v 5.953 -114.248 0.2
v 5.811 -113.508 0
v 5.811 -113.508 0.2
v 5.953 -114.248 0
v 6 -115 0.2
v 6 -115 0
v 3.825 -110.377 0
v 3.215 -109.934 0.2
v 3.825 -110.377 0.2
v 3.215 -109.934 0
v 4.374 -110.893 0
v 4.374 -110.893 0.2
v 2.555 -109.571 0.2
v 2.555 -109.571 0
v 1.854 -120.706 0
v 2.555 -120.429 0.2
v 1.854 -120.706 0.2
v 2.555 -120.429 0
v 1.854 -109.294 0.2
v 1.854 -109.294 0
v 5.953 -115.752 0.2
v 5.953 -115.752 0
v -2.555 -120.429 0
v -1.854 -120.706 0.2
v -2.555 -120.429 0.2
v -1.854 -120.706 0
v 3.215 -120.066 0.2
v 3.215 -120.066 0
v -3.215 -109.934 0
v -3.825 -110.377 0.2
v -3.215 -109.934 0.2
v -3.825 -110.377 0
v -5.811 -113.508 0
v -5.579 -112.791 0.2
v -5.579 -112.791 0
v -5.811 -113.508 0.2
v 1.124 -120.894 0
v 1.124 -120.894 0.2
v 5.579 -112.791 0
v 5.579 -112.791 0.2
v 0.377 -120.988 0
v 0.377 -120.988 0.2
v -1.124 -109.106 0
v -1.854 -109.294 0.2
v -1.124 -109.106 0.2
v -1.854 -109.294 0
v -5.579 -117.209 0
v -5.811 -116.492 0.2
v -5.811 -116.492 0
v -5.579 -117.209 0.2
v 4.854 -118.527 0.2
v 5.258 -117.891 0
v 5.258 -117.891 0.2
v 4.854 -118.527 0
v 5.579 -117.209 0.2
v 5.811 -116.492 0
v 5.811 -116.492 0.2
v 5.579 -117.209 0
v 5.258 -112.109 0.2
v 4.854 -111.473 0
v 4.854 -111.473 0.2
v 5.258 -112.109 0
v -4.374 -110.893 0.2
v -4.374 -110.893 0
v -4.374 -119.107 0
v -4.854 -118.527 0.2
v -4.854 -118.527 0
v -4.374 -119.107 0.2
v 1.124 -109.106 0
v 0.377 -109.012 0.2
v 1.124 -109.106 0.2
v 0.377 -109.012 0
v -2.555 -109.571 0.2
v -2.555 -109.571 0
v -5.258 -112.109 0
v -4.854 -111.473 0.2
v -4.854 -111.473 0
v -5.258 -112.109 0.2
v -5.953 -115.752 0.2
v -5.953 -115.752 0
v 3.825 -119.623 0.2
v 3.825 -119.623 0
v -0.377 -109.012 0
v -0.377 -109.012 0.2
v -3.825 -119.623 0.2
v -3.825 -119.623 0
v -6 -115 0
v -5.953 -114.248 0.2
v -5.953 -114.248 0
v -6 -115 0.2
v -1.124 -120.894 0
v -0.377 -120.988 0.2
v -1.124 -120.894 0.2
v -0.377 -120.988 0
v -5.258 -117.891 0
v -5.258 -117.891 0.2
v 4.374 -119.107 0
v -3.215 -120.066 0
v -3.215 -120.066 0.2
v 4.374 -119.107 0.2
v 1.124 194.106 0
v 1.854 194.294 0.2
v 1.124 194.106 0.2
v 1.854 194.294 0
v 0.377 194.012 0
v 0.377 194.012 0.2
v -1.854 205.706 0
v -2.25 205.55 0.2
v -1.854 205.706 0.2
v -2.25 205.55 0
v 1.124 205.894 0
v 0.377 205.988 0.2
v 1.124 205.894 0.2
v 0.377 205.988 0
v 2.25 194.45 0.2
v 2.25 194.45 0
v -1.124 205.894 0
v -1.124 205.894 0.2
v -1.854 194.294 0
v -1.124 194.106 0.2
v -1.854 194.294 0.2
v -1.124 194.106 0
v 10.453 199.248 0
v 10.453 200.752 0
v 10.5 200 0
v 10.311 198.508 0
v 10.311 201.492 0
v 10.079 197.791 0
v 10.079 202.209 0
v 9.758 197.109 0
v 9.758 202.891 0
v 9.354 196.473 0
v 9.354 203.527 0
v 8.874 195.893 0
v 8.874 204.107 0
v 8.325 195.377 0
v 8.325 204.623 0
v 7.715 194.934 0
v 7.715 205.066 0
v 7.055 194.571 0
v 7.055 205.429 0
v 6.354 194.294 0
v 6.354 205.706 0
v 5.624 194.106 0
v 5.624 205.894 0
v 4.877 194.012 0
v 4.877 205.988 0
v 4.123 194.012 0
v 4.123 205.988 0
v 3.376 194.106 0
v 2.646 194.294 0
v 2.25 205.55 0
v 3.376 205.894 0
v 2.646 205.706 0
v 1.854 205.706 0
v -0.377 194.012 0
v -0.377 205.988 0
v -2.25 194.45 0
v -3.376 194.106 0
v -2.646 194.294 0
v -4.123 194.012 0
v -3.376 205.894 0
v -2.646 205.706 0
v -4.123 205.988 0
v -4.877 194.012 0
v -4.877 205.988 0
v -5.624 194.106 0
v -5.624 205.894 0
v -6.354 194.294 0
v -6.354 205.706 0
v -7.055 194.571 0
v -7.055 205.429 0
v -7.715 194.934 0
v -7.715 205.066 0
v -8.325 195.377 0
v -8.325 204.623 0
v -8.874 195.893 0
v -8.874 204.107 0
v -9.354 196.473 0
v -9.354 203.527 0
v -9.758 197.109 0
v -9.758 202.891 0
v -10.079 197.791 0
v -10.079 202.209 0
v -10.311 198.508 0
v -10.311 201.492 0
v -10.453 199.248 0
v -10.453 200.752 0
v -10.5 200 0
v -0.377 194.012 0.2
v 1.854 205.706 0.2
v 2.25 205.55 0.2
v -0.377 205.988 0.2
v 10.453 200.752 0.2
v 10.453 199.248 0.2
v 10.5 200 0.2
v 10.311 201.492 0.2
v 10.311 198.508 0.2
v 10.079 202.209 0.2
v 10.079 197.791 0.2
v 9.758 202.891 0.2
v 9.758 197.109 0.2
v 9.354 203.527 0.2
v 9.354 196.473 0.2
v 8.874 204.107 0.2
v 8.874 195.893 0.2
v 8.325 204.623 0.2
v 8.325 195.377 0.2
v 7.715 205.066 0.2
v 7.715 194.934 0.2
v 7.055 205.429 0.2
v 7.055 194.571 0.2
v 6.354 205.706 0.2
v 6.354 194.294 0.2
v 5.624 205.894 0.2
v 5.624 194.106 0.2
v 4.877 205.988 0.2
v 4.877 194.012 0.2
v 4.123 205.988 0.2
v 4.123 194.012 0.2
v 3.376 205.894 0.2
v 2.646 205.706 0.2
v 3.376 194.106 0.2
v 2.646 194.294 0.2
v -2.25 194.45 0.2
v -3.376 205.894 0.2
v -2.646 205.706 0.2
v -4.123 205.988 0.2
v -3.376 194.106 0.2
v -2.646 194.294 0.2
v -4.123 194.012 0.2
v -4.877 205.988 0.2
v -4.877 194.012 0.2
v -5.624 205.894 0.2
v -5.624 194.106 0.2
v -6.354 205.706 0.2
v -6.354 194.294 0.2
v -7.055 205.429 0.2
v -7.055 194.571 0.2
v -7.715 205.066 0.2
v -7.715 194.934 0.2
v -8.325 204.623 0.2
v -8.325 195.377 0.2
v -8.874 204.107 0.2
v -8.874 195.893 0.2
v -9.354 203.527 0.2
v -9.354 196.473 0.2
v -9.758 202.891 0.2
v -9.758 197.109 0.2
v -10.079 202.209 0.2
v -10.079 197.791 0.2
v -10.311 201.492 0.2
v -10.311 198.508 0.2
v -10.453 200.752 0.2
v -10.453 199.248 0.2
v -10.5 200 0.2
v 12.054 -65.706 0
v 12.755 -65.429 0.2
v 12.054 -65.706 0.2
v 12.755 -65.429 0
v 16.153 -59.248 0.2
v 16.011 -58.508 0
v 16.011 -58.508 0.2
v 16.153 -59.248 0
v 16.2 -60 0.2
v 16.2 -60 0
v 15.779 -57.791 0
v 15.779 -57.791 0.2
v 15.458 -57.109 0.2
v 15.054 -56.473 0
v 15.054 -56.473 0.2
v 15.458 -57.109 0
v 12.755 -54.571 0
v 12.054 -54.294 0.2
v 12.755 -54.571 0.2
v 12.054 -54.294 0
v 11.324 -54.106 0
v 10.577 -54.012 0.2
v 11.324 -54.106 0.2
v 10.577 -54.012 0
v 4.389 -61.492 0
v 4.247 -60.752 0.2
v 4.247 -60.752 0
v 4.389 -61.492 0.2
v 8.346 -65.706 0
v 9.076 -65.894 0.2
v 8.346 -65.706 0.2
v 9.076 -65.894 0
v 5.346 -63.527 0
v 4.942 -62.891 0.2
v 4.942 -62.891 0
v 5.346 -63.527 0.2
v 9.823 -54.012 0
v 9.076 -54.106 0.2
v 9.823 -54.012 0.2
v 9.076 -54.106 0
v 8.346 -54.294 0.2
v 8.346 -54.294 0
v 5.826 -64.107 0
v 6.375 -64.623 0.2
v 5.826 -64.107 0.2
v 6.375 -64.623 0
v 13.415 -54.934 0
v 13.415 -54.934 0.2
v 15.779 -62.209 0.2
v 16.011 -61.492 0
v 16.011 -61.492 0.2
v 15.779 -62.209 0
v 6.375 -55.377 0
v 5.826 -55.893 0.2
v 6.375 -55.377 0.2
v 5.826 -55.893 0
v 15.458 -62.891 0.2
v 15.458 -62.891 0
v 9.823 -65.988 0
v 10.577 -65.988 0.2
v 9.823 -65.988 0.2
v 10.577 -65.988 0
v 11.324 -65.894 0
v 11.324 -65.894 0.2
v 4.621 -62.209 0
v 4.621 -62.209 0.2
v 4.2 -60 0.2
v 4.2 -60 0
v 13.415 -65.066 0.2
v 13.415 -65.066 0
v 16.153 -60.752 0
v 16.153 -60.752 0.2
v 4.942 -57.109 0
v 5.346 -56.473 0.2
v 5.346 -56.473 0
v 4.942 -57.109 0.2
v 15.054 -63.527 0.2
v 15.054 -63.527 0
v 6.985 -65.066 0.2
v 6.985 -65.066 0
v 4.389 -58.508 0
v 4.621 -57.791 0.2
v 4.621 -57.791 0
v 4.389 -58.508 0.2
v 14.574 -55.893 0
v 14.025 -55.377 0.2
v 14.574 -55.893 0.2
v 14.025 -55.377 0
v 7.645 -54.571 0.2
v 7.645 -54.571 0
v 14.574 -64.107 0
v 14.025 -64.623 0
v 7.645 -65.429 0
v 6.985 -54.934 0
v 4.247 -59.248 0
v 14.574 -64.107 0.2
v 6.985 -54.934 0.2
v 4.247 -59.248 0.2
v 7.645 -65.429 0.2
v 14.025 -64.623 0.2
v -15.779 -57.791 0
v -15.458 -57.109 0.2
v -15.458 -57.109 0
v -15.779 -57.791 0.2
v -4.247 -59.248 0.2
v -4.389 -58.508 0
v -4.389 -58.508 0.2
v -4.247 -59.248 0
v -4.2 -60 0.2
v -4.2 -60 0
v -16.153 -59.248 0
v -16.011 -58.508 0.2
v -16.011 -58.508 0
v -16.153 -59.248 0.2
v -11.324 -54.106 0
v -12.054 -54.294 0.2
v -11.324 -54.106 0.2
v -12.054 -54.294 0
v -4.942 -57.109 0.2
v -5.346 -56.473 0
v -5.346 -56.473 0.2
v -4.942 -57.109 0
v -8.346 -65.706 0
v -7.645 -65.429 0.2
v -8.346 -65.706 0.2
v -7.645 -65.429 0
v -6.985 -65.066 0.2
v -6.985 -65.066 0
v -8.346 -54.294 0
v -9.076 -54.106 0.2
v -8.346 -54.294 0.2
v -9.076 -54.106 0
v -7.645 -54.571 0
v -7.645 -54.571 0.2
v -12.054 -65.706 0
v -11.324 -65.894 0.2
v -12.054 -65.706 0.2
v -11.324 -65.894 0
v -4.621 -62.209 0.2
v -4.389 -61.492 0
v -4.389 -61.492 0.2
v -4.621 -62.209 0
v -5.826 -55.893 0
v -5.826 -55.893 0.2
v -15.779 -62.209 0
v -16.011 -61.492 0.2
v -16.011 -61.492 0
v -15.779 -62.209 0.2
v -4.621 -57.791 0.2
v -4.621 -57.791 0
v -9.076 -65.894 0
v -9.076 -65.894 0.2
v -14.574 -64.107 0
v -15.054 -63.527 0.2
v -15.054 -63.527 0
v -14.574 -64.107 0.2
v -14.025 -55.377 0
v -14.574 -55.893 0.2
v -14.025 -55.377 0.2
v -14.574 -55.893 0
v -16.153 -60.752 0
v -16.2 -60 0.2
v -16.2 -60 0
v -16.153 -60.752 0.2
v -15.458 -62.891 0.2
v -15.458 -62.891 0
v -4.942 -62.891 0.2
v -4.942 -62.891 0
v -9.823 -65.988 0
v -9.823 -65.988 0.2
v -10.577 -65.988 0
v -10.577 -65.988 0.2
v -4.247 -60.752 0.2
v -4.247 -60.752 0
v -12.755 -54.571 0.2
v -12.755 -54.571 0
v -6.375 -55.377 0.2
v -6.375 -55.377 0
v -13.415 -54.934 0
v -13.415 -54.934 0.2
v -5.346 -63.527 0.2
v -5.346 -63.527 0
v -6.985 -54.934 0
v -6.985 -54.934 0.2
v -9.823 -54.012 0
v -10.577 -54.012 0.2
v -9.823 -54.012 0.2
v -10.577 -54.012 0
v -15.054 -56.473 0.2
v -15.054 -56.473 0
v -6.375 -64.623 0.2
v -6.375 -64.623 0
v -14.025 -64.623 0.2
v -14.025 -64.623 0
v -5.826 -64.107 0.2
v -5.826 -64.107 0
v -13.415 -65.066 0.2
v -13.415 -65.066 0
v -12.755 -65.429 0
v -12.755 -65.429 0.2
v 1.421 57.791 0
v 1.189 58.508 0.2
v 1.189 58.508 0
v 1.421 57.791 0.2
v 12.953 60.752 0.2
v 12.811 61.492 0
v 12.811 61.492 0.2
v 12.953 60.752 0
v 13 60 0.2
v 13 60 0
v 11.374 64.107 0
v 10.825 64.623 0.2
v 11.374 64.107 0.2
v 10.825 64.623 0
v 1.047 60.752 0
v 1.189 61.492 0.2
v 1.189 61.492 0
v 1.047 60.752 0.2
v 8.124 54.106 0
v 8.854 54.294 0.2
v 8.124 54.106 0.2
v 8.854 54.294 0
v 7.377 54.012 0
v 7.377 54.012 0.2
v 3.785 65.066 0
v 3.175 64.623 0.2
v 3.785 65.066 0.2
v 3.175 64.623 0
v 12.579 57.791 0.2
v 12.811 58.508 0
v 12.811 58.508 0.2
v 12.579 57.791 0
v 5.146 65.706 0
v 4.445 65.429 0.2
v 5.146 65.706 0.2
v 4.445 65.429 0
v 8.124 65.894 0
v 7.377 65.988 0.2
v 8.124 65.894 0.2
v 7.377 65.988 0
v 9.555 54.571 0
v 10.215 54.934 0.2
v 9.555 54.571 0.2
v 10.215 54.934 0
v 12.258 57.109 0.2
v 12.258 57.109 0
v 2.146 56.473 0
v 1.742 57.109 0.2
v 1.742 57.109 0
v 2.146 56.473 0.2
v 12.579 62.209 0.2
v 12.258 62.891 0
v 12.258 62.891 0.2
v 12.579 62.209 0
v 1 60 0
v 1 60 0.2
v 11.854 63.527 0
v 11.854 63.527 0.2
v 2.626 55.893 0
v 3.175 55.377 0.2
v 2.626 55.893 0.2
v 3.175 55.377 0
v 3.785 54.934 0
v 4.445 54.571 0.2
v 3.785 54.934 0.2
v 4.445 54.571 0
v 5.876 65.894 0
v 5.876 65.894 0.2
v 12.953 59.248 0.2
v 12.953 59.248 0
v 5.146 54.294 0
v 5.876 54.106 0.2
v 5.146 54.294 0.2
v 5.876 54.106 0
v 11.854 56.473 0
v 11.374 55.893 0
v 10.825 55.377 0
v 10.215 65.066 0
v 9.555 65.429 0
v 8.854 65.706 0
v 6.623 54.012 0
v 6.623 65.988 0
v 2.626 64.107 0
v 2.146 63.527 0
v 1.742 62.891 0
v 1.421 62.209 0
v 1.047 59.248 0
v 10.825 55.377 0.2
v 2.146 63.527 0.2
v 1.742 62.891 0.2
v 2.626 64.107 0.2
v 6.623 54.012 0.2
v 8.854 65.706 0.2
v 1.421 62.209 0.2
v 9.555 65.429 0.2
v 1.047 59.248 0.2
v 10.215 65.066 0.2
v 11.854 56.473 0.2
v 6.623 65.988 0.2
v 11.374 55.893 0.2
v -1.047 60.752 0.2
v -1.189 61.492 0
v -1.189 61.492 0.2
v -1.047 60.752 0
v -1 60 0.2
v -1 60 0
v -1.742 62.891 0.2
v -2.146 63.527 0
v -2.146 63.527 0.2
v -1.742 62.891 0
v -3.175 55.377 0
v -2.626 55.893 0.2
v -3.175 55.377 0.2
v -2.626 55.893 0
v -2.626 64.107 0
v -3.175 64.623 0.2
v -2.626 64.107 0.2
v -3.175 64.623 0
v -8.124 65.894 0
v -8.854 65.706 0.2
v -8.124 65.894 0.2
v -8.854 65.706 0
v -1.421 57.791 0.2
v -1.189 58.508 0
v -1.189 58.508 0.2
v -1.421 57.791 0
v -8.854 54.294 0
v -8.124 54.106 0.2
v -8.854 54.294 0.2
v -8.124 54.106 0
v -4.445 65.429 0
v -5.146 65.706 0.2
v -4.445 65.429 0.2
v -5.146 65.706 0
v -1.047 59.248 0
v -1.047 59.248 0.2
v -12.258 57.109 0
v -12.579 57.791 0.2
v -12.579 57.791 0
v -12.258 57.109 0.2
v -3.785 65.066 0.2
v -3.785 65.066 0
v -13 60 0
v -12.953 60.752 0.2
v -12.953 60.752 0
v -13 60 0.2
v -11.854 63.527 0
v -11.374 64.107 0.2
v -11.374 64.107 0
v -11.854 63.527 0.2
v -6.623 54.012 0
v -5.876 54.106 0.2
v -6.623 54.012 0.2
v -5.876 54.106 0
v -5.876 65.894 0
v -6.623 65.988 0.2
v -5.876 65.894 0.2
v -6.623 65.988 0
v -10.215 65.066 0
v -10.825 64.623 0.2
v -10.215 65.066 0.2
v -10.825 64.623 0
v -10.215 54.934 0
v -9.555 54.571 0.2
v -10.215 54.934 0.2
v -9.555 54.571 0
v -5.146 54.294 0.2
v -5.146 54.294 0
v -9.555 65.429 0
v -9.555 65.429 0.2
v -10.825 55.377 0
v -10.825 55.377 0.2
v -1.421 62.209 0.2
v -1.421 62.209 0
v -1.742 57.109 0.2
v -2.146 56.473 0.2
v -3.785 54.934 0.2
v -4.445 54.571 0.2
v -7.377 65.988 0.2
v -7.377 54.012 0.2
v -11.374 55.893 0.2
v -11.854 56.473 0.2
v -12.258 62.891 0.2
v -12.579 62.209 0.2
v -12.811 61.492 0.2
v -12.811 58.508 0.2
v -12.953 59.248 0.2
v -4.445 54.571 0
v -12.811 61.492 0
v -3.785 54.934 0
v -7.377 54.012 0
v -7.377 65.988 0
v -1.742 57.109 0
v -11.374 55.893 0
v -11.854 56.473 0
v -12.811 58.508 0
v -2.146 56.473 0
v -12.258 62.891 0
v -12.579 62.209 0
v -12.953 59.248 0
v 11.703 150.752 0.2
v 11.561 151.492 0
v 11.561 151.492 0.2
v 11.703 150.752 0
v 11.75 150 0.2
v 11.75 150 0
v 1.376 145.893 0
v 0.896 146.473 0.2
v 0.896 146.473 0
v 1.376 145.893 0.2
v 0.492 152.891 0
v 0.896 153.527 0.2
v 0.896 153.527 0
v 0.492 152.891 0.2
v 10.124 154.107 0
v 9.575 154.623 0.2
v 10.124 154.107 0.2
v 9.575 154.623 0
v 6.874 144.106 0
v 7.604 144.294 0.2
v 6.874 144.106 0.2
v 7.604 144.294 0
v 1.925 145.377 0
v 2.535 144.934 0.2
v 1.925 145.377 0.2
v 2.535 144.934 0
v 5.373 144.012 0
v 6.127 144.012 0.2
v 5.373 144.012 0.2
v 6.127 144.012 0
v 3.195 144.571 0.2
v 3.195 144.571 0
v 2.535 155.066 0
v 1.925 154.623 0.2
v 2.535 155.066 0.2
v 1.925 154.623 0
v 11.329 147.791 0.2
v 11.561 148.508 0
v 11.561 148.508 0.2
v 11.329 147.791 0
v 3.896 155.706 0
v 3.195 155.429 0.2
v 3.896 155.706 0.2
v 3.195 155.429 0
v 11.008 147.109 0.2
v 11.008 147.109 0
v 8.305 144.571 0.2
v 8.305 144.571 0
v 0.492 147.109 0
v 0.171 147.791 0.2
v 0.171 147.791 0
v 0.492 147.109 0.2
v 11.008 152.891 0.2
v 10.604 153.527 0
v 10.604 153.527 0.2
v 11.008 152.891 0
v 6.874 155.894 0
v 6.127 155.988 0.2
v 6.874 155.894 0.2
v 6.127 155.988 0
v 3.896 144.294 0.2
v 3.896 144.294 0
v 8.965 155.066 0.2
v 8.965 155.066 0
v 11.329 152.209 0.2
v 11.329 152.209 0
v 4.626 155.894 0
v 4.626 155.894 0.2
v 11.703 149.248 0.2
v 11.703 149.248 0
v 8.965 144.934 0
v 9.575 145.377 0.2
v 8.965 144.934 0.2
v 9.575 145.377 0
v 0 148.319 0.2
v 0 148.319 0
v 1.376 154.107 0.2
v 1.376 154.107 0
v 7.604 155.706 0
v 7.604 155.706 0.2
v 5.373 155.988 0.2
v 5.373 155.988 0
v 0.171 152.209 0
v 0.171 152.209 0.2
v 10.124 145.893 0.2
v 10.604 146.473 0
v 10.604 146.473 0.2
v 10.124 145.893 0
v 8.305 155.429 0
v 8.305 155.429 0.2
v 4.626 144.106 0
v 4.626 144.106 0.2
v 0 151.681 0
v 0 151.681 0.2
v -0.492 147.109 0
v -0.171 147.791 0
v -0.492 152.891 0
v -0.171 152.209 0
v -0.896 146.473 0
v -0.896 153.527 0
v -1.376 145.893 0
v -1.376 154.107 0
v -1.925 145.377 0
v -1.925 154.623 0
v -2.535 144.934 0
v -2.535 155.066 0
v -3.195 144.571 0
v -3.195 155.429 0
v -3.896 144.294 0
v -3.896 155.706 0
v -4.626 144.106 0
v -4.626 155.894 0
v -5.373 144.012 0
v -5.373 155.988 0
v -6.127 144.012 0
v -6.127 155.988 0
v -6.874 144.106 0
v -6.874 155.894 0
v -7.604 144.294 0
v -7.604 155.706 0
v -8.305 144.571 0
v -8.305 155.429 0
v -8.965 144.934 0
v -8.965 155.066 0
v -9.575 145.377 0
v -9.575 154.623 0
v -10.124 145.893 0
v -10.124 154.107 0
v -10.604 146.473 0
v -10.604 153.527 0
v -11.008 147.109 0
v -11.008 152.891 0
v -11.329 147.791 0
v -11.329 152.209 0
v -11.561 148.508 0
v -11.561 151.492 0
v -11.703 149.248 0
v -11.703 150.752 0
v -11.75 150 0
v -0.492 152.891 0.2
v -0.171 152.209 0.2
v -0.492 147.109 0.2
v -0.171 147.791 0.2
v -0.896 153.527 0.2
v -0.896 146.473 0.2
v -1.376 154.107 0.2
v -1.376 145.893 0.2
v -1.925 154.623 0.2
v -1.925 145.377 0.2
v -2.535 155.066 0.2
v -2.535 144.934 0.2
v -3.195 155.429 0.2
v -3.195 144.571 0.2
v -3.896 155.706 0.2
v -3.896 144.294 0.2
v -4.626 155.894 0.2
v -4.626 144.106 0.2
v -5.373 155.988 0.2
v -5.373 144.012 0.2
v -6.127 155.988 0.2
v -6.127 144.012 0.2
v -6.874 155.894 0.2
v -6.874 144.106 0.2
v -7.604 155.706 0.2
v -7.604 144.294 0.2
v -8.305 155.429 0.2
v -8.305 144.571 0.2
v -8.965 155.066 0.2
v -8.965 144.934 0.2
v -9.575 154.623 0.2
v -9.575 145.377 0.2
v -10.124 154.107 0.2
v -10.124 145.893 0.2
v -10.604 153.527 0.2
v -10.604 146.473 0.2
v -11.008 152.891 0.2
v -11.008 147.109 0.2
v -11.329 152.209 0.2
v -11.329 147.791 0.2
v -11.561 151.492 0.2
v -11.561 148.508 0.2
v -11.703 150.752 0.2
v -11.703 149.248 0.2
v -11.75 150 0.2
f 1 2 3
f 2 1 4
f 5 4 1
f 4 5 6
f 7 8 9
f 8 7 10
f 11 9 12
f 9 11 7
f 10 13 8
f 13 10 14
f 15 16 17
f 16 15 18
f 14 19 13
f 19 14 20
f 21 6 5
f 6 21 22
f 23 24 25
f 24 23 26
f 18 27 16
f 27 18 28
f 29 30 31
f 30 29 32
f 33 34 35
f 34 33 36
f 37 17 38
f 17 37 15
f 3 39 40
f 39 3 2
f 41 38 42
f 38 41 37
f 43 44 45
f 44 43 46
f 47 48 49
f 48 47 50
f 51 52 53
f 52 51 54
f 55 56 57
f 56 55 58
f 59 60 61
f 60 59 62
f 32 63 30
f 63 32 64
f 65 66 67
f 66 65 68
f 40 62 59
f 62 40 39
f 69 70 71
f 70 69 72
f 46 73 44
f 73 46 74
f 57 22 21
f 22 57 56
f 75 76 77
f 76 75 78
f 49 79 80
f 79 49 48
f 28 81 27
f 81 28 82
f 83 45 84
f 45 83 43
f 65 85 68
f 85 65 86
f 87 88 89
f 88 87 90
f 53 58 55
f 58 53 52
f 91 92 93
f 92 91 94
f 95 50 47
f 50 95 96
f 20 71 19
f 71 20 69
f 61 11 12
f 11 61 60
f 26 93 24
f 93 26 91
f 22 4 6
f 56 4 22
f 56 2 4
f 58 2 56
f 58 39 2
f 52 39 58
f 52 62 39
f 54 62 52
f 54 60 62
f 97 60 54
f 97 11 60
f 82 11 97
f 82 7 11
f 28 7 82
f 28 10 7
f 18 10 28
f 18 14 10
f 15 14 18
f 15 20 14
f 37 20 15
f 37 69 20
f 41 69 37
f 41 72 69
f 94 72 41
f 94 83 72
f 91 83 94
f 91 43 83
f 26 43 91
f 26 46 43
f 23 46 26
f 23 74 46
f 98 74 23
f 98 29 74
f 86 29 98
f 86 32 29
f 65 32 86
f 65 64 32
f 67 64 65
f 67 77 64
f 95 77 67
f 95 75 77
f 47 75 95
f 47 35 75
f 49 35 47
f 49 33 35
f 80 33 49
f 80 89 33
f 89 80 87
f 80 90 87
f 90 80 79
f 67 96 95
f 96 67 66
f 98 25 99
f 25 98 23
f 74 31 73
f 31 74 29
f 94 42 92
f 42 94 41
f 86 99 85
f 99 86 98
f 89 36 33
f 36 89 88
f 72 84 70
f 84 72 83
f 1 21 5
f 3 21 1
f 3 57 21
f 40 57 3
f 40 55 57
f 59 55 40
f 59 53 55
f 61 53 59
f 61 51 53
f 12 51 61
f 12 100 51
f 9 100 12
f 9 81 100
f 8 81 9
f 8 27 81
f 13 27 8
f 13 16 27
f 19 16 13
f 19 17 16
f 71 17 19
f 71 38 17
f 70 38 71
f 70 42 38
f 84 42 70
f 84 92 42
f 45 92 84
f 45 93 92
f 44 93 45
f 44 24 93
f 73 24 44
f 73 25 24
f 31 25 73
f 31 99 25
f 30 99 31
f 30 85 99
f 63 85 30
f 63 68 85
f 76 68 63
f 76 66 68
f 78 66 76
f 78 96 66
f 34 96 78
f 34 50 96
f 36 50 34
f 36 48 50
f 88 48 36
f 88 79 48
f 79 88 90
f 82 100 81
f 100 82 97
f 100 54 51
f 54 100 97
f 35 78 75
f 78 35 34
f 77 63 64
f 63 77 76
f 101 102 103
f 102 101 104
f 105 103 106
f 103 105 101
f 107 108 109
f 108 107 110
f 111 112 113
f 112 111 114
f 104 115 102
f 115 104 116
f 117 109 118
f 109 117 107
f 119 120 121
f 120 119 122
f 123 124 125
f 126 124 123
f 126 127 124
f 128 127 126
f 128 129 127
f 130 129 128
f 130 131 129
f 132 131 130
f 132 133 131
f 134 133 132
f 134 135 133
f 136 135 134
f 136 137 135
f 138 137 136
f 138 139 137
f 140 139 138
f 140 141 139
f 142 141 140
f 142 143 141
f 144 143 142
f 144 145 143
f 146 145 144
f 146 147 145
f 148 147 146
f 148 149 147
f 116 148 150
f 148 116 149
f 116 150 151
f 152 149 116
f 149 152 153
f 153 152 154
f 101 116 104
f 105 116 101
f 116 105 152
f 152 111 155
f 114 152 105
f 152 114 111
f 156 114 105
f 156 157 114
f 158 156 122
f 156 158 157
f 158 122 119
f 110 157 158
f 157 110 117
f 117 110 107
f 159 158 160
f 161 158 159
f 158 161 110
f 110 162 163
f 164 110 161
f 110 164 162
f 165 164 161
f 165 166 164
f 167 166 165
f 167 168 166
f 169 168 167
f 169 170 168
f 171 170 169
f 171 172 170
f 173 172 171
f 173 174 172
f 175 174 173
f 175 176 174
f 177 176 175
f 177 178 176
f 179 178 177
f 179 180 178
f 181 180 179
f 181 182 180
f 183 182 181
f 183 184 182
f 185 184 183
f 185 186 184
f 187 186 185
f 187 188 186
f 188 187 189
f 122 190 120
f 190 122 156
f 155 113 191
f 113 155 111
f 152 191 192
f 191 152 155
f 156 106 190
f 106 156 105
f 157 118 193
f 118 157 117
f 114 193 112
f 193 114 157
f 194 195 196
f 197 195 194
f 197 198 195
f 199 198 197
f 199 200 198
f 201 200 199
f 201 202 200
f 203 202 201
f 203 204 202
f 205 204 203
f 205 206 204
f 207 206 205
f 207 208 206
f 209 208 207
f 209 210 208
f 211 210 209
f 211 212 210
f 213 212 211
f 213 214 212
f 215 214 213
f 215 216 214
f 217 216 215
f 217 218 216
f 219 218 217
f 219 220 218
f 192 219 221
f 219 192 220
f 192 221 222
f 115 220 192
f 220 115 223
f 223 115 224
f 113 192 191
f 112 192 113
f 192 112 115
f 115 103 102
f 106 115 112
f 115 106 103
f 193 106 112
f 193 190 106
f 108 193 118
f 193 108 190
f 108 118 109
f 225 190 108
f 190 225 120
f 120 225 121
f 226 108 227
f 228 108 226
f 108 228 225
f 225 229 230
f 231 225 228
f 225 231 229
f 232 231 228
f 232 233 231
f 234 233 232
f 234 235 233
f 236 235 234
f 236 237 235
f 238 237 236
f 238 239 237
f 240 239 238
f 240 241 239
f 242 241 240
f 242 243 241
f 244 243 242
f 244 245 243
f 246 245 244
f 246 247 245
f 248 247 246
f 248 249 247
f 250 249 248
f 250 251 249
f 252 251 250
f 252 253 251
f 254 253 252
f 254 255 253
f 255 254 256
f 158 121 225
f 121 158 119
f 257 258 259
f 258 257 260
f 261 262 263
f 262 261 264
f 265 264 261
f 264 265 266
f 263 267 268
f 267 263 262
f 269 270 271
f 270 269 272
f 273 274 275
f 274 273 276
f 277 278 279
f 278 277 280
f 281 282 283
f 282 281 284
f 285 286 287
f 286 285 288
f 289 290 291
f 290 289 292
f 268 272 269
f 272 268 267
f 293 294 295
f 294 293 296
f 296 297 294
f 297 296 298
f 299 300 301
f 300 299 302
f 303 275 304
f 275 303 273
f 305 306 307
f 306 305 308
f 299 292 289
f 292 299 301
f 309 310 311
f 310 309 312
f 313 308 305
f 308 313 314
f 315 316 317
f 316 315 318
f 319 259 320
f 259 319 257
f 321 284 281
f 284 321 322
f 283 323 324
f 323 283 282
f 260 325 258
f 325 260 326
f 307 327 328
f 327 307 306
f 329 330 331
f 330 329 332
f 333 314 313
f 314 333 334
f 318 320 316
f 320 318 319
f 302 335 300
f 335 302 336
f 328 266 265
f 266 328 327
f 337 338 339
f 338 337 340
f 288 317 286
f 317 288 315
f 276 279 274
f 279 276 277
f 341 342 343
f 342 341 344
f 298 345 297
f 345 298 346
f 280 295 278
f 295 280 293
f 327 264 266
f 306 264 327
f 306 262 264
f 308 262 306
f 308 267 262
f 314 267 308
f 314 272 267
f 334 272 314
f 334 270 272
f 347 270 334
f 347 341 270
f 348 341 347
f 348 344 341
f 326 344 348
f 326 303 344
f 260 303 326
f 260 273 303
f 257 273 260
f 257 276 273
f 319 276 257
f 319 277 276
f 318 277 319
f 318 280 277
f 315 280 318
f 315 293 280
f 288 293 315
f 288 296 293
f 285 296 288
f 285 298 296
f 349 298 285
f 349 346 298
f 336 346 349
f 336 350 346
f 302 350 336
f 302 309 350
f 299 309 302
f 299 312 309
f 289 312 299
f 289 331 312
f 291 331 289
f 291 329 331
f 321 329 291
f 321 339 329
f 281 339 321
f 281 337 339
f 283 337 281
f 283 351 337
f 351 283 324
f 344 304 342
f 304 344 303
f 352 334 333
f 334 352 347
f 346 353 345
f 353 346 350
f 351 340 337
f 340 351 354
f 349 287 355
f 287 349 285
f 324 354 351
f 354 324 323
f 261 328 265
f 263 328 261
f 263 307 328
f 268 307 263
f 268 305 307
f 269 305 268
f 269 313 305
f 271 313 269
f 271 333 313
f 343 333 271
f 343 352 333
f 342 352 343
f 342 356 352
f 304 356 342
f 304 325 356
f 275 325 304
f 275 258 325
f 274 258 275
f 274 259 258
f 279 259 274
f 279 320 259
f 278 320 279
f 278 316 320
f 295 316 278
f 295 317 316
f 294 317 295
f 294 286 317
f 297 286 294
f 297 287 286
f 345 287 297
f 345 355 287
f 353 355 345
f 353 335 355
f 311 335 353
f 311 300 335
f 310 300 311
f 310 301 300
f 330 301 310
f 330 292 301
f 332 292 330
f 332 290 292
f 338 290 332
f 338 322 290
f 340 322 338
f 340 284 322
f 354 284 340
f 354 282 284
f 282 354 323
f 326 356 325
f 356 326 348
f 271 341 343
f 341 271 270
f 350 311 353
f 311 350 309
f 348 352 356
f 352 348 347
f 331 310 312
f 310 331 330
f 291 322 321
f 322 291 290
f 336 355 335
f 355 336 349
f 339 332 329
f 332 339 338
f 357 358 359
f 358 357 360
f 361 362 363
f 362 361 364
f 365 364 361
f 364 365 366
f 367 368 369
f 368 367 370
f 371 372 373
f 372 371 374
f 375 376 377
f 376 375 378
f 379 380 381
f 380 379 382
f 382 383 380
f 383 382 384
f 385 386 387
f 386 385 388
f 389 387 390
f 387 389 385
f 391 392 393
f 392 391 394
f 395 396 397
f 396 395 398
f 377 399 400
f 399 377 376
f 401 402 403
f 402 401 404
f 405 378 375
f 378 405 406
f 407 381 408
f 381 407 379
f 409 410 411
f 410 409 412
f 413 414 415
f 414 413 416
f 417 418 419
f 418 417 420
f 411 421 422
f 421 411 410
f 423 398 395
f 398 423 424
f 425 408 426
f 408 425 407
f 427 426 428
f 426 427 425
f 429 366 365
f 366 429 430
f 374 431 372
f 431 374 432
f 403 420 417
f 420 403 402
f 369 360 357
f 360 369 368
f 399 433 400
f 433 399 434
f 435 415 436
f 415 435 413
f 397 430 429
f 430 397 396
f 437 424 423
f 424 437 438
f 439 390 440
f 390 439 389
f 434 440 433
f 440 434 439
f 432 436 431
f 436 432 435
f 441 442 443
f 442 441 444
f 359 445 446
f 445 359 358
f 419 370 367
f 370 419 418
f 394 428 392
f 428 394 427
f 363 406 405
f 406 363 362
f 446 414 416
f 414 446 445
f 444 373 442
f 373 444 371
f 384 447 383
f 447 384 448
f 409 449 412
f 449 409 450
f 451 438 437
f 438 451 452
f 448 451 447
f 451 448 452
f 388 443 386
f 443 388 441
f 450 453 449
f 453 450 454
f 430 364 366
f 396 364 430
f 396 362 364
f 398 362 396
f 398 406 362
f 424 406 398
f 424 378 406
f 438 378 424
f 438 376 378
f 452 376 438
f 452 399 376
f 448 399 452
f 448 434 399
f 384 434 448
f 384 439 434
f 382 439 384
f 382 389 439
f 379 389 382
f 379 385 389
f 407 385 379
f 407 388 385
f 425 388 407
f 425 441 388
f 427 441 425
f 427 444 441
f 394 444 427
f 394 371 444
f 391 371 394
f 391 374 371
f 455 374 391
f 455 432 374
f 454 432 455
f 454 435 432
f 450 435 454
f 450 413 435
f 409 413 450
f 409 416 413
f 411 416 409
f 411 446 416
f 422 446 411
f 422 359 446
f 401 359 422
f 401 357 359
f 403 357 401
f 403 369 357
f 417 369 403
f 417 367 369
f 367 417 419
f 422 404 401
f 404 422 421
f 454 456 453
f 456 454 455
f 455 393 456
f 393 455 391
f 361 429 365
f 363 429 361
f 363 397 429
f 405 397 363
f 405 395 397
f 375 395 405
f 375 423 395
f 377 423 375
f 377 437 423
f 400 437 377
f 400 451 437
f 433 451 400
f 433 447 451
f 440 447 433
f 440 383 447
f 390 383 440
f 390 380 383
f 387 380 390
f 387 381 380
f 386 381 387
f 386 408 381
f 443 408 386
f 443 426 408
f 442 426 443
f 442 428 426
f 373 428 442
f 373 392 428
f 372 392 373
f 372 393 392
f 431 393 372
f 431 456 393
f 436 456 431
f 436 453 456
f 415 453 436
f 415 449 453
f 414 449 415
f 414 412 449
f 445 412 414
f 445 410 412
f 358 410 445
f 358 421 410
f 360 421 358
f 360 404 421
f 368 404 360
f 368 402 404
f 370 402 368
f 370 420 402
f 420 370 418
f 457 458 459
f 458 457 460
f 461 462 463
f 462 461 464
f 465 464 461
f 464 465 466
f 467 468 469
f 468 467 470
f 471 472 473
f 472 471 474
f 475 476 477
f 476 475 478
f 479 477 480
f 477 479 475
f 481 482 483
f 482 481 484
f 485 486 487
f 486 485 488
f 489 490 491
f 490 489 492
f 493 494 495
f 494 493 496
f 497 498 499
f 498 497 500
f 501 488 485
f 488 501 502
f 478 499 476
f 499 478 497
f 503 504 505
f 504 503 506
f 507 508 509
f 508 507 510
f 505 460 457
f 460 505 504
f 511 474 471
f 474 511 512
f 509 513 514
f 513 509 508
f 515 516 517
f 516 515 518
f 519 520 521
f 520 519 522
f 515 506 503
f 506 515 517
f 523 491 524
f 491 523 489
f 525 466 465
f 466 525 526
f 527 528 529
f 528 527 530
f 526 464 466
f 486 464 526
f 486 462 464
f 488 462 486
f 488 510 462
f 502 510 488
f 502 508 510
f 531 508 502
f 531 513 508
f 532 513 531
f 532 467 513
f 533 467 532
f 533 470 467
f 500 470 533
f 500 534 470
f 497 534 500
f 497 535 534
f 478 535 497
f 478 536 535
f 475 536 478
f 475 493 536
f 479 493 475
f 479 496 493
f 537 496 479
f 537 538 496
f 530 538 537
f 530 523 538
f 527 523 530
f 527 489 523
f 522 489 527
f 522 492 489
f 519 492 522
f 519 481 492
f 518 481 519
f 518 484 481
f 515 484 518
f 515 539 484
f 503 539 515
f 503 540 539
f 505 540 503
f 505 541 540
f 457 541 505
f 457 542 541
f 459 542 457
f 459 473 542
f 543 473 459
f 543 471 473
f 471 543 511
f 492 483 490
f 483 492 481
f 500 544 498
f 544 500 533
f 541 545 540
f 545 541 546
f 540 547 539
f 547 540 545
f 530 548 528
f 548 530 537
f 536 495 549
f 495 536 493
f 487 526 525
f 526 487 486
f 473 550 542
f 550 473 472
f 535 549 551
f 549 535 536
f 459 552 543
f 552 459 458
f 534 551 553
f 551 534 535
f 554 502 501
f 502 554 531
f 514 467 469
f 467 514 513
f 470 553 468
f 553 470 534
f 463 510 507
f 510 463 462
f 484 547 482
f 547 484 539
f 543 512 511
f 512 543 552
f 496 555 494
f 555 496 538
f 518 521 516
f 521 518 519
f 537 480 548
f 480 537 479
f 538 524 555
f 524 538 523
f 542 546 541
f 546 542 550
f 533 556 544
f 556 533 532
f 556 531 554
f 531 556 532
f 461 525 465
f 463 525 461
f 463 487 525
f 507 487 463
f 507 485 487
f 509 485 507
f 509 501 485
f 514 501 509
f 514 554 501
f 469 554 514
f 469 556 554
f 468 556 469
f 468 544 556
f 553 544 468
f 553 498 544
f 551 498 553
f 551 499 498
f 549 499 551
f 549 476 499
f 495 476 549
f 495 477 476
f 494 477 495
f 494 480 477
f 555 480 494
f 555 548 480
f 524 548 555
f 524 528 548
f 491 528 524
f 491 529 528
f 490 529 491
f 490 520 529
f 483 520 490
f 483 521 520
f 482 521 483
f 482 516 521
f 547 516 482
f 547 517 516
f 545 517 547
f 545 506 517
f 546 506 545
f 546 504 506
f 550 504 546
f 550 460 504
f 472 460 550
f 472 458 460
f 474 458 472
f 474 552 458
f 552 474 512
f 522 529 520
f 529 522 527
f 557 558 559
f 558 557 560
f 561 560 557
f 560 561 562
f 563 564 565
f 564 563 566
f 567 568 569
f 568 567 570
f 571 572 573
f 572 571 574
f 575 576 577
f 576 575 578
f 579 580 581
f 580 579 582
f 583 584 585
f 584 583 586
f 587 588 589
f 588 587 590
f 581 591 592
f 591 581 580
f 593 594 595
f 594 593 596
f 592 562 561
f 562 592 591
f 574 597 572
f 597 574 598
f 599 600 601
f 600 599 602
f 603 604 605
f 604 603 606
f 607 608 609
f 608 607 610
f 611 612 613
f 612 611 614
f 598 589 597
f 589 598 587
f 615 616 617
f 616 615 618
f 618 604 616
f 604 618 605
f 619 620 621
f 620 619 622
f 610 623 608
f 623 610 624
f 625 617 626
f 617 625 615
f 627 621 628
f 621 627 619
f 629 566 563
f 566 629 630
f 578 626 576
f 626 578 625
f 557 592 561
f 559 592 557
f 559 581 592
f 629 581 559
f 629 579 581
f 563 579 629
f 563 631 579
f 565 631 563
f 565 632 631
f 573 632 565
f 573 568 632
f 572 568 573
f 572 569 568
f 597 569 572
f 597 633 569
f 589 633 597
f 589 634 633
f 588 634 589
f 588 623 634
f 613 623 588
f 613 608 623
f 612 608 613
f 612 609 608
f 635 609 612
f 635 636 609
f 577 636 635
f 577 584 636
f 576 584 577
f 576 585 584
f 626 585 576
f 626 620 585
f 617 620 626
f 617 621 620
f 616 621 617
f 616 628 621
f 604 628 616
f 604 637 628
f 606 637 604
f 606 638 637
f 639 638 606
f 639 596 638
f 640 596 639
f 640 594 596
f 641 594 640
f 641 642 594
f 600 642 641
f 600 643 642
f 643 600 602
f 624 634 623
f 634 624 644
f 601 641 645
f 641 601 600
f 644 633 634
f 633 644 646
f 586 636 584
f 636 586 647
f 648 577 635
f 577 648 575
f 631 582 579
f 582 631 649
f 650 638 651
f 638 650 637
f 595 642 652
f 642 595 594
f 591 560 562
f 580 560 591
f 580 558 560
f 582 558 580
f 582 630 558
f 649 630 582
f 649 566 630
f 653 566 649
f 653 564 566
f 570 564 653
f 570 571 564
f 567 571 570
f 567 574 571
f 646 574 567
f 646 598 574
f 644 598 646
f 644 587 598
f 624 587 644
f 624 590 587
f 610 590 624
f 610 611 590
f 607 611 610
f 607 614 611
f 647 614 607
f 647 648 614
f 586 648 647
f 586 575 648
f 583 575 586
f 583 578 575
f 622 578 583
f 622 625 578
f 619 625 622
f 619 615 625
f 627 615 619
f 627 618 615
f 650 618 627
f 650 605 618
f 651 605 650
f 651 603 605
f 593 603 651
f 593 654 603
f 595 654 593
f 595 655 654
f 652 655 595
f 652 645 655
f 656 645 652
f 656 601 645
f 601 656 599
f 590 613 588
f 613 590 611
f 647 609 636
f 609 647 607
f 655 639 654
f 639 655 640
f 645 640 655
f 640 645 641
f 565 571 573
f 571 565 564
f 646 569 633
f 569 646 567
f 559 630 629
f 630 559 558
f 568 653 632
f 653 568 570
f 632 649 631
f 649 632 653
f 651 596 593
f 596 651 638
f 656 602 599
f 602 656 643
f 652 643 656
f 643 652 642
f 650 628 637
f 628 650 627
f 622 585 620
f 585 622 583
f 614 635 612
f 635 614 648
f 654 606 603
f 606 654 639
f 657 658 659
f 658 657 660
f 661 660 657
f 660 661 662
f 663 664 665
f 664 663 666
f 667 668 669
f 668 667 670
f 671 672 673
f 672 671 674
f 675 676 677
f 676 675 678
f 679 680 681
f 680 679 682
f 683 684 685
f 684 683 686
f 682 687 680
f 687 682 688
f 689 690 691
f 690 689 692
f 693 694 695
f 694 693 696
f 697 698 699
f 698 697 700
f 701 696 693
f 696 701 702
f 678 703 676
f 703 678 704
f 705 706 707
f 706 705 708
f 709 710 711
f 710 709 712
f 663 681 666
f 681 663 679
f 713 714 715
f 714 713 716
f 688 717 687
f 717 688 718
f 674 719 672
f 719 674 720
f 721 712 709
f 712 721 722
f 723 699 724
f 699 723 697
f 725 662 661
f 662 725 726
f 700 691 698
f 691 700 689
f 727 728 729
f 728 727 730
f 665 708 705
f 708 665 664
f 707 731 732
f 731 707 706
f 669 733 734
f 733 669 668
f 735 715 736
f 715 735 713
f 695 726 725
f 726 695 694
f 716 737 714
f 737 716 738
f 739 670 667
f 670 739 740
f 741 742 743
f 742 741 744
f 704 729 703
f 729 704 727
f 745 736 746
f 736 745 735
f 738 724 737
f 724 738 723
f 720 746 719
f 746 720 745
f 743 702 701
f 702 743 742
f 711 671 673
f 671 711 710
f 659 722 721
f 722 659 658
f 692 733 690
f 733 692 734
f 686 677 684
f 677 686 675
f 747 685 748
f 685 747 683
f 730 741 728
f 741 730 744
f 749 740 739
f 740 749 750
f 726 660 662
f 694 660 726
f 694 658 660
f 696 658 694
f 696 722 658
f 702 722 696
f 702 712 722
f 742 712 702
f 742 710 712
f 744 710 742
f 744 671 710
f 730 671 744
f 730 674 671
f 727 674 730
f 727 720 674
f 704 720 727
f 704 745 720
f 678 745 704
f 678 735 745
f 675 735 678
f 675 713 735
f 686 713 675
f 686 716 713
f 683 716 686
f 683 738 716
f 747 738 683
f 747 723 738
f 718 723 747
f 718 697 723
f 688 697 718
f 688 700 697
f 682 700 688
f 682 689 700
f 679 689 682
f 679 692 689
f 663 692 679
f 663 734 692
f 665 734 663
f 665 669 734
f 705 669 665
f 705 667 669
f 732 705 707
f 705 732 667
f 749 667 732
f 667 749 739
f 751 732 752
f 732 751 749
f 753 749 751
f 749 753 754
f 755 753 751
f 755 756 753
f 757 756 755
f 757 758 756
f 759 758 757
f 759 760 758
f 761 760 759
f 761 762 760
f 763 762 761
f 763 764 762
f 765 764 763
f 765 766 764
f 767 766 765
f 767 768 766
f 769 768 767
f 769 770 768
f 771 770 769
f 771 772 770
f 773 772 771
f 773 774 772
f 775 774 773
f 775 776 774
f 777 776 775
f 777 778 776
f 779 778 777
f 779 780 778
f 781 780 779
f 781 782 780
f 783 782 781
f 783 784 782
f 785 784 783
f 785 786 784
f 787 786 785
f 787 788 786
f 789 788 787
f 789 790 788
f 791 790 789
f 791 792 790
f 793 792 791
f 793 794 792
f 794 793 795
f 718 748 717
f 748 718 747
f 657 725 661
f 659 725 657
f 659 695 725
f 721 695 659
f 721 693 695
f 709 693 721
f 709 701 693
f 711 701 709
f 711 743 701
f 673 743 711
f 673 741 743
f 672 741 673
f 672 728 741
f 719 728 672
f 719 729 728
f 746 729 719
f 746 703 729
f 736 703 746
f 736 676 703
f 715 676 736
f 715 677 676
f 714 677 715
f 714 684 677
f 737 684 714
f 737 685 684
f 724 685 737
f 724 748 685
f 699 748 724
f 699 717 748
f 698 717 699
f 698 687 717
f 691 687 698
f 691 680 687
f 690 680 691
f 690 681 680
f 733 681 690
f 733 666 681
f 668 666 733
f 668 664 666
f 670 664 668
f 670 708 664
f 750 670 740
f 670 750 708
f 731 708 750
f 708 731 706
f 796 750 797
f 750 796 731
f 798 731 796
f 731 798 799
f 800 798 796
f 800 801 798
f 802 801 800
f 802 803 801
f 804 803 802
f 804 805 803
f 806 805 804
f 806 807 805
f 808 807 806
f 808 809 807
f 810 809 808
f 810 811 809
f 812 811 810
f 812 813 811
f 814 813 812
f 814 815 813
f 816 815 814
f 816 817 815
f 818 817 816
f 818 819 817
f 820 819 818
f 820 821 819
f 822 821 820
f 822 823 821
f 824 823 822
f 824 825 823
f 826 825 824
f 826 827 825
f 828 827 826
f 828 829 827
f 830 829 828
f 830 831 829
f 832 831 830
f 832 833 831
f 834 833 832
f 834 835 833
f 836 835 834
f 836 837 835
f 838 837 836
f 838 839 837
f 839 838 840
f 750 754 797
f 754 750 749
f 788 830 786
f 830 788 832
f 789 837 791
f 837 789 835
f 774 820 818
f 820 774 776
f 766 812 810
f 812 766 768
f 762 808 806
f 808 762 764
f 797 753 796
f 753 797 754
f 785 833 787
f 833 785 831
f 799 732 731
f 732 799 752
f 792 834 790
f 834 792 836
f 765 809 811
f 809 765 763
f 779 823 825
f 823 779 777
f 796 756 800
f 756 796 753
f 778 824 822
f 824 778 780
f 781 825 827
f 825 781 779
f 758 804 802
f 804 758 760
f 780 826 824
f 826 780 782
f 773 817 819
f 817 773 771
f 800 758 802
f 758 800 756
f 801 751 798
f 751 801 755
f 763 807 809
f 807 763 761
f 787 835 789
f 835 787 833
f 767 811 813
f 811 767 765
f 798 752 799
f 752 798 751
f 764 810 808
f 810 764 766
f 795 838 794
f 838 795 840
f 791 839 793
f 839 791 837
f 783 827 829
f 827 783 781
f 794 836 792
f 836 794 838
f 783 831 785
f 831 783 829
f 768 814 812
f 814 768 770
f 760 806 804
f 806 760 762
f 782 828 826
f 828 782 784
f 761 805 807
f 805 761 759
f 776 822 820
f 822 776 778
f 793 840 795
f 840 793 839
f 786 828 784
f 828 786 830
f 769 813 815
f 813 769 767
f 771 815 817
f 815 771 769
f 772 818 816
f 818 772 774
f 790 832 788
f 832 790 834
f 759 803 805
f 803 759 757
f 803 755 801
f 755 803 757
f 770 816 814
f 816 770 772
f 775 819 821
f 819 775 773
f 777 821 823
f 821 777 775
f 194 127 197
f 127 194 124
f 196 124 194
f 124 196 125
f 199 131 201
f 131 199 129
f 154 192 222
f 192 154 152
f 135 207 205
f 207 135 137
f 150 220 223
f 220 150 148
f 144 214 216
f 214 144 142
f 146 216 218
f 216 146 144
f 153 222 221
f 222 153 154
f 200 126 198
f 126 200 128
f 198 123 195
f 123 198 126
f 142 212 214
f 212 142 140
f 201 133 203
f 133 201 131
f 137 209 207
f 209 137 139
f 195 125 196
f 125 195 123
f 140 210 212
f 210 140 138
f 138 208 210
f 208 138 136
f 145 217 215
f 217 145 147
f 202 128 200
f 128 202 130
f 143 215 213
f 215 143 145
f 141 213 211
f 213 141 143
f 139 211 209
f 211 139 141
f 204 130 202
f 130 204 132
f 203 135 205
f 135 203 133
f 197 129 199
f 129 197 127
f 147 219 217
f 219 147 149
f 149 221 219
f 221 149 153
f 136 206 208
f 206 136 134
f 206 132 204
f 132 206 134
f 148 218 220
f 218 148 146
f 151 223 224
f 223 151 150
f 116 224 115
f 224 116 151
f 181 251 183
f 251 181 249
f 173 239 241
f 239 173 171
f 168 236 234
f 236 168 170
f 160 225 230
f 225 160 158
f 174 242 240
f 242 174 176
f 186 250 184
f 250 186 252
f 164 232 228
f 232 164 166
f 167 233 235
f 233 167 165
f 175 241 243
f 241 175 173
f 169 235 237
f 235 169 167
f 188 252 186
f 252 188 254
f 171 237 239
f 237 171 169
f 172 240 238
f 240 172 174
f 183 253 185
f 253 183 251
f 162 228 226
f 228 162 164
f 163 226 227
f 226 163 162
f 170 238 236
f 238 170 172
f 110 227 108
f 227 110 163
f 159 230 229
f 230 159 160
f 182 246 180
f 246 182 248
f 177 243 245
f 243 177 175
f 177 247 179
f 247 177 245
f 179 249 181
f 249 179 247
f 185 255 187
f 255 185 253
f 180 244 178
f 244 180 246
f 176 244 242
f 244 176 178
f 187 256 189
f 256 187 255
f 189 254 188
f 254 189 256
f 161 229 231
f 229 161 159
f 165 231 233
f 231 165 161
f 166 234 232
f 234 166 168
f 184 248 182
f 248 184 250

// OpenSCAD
union() {
  union() {
    union() {
      union() {
        union() {
          union() {
            union() {
              union() {
                union() {
                  translate([0, -115, 0]) {
                    cylinder(h = 0.2, r = 6);
                  }
                  translate([0, 200, 0]) {
                    cylinder(h = 0.2, r = 6);
                  }
                }
                translate([10.2, -60, 0]) {
                  cylinder(h = 0.2, r = 6);
                }
              }
              translate([-10.2, -60, 0]) {
                cylinder(h = 0.2, r = 6);
              }
            }
            translate([7, 60, 0]) {
              cylinder(h = 0.2, r = 6);
            }
          }
          translate([-7, 60, 0]) {
            cylinder(h = 0.2, r = 6);
          }
        }
        translate([5.75, 150, 0]) {
          cylinder(h = 0.2, r = 6);
        }
      }
      translate([-5.75, 150, 0]) {
        cylinder(h = 0.2, r = 6);
      }
    }
    translate([4.5, 200, 0]) {
      cylinder(h = 0.2, r = 6);
    }
  }
  translate([-4.5, 200, 0]) {
    cylinder(h = 0.2, r = 6);
  }
}
$fn = 50;
